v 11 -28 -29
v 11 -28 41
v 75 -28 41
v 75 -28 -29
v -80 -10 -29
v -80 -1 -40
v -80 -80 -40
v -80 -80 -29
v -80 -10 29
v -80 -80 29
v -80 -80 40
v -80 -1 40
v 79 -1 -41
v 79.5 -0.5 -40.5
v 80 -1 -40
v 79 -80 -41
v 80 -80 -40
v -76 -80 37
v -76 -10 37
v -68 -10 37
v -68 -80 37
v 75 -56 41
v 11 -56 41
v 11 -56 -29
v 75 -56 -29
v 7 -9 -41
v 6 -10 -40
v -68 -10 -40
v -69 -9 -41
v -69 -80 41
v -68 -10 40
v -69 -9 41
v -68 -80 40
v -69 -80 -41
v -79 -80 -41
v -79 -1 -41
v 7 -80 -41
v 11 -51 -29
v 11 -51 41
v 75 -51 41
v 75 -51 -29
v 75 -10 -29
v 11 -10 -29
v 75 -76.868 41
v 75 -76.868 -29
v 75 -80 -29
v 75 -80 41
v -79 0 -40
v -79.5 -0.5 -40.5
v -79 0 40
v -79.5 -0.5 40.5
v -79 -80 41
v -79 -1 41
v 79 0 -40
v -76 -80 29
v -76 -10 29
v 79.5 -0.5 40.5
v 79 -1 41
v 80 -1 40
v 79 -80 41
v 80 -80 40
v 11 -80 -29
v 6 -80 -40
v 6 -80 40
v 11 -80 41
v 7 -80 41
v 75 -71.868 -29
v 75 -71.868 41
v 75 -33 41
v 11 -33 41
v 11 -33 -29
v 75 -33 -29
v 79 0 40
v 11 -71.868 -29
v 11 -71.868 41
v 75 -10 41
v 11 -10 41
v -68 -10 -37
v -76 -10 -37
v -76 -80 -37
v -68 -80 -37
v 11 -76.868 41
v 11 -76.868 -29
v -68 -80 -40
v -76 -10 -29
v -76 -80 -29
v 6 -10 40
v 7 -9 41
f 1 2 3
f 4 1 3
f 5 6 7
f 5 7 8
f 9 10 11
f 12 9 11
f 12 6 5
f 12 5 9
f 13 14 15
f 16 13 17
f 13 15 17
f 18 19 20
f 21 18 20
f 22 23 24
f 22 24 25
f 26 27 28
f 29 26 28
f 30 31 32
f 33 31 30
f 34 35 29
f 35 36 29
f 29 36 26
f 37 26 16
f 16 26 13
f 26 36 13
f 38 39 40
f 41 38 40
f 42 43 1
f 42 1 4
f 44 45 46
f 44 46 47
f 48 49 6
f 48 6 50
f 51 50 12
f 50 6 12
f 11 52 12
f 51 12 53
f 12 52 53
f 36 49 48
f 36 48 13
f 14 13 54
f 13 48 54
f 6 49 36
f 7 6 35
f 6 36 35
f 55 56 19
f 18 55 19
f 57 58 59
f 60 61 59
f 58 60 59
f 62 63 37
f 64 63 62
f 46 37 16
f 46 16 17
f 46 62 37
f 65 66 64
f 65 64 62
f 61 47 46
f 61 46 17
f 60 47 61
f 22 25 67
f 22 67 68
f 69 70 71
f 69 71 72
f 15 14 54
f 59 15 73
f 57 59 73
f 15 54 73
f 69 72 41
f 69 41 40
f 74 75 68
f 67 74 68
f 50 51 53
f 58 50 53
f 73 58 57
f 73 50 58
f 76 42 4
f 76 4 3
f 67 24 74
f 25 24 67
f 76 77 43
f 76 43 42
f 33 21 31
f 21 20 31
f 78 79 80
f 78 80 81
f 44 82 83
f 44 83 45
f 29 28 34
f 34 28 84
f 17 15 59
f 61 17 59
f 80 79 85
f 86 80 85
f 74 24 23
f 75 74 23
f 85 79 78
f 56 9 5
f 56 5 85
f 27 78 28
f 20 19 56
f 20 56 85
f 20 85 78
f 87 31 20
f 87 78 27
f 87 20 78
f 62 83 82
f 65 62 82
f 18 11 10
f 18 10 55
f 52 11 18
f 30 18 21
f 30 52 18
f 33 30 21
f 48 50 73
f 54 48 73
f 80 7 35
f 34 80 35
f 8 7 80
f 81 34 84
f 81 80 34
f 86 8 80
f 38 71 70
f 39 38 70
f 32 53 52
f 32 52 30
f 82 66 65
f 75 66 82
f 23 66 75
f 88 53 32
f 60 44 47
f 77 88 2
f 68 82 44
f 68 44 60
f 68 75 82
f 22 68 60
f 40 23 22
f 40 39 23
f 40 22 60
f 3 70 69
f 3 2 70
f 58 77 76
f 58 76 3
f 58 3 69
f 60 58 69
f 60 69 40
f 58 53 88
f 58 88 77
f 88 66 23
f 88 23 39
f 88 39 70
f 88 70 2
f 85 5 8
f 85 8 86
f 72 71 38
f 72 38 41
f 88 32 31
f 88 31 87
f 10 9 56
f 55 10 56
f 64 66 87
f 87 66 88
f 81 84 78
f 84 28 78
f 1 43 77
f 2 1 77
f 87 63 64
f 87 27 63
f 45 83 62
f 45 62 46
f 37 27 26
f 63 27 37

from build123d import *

# Parameters (mm, degrees)
F0_W      = 160
F0_H      = 82
F1_DEPTH  = 10
F2_W      = 12
F2_H      = 12
F3_DEPTH  = 70
F4_W      = 74
F4_H      = 12
F5_DEPTH  = 70
F6_W      = 5
F6_H      = 70
F7_DEPTH  = 70
F8_W      = 64
F8_H      = 5
F9_DEPTH  = 80
F10_W     = 8
F10_H     = 8
F11_DEPTH = 70
F12_W     = 8
F12_H     = 8
F13_DEPTH = 70
F14_SIZE  = 1
F15_SIZE  = 1
F16_SIZE  = 1
F17_SIZE  = 1
F18_SIZE  = 1
F19_SIZE  = 1
F20_SIZE  = 1
F21_SIZE  = 1
F22_SIZE  = 1
F23_SIZE  = 1
F24_SIZE  = 1
F25_SIZE  = 1
F26_SIZE  = 1
F27_SIZE  = 1


with BuildPart() as f1:
    # F0 (on Front) → F1 (new body)
    with BuildSketch(Plane.XZ):
        Rectangle(F0_W, F0_H)
    extrude(amount=F1_DEPTH)

    # F2 (on face) → F3 (join)
    with BuildSketch(Plane.XZ.offset(10)):
        with Locations((-74, 35)):
            Rectangle(F2_W, F2_H)
        with Locations((-74, -35)):
            Rectangle(F2_W, F2_H)
    extrude(amount=F3_DEPTH)

    # F4 (on face) → F5 (join)
    with BuildSketch(Plane.XZ.offset(10)):
        with Locations((43, -35)):
            Rectangle(F4_W, F4_H)
    extrude(amount=F5_DEPTH)

    # F6 (on face) → F7 (join)
    with BuildSketch(Plane.XZ.offset(10)):
        with Locations((8.5, 6)):
            Rectangle(F6_W, F6_H)
        with Locations((77.5, 6)):
            Rectangle(F6_W, F6_H)
    extrude(amount=F7_DEPTH)

    # F8 (on face) → F9 (join)
    with BuildSketch(Plane.XY.offset(41)):
        with Locations((43, -30.5)):
            Rectangle(F8_W, F8_H)
        with Locations((43, -53.5)):
            Rectangle(F8_W, F8_H)
        with Locations((43, -74.3680498004)):
            Rectangle(F8_W, F8_H)
    extrude(amount=-F9_DEPTH)

    # F10 (on face) → F11 (cut)
    with BuildSketch(Plane.XZ.offset(80)):
        with Locations((-72, 33)):
            Rectangle(F10_W, F10_H)
    extrude(amount=-F11_DEPTH, mode=Mode.SUBTRACT)

    # F12 (on face) → F13 (cut)
    with BuildSketch(Plane.XZ.offset(80)):
        with Locations((-72, -33)):
            Rectangle(F12_W, F12_H)
    extrude(amount=-F13_DEPTH, mode=Mode.SUBTRACT)

    # F14
    f14_edges = [f1.edges().sort_by_distance(p)[0] for p in [
        (-80, 0, 0),
    ]]
    chamfer(f14_edges, length=F14_SIZE)

    # F15
    f15_edges = [f1.edges().sort_by_distance(p)[0] for p in [
        (0.5, 0, 41),
    ]]
    chamfer(f15_edges, length=F15_SIZE)

    # F16
    f16_edges = [f1.edges().sort_by_distance(p)[0] for p in [
        (80, 0, -0.5),
    ]]
    chamfer(f16_edges, length=F16_SIZE)

    # F17
    f17_edges = [f1.edges().sort_by_distance(p)[0] for p in [
        (0, 0, -41),
    ]]
    chamfer(f17_edges, length=F17_SIZE)

    # F18
    f18_edges = [f1.edges().sort_by_distance(p)[0] for p in [
        (-80, -40.5, 41),
    ]]
    chamfer(f18_edges, length=F18_SIZE)

    # F19
    f19_edges = [f1.edges().sort_by_distance(p)[0] for p in [
        (80, -40.5, 41),
    ]]
    chamfer(f19_edges, length=F19_SIZE)

    # F20
    f20_edges = [f1.edges().sort_by_distance(p)[0] for p in [
        (-80, -40.5, -41),
    ]]
    chamfer(f20_edges, length=F20_SIZE)

    # F21
    f21_edges = [f1.edges().sort_by_distance(p)[0] for p in [
        (80, -40.5, -41),
    ]]
    chamfer(f21_edges, length=F21_SIZE)

    # F22
    f22_edges = [f1.edges().sort_by_distance(p)[0] for p in [
        (6, -45, -41),
    ]]
    chamfer(f22_edges, length=F22_SIZE)

    # F23
    f23_edges = [f1.edges().sort_by_distance(p)[0] for p in [
        (-31, -10, -41),
    ]]
    chamfer(f23_edges, length=F23_SIZE)

    # F24
    f24_edges = [f1.edges().sort_by_distance(p)[0] for p in [
        (-68, -45, -41),
    ]]
    chamfer(f24_edges, length=F24_SIZE)

    # F25
    f25_edges = [f1.edges().sort_by_distance(p)[0] for p in [
        (-31, -10, 41),
    ]]
    chamfer(f25_edges, length=F25_SIZE)

    # F26
    f26_edges = [f1.edges().sort_by_distance(p)[0] for p in [
        (-68, -45, 41),
    ]]
    chamfer(f26_edges, length=F26_SIZE)

    # F27
    f27_edges = [f1.edges().sort_by_distance(p)[0] for p in [
        (6, -45, 41),
    ]]
    chamfer(f27_edges, length=F27_SIZE)


solid = f1.part
